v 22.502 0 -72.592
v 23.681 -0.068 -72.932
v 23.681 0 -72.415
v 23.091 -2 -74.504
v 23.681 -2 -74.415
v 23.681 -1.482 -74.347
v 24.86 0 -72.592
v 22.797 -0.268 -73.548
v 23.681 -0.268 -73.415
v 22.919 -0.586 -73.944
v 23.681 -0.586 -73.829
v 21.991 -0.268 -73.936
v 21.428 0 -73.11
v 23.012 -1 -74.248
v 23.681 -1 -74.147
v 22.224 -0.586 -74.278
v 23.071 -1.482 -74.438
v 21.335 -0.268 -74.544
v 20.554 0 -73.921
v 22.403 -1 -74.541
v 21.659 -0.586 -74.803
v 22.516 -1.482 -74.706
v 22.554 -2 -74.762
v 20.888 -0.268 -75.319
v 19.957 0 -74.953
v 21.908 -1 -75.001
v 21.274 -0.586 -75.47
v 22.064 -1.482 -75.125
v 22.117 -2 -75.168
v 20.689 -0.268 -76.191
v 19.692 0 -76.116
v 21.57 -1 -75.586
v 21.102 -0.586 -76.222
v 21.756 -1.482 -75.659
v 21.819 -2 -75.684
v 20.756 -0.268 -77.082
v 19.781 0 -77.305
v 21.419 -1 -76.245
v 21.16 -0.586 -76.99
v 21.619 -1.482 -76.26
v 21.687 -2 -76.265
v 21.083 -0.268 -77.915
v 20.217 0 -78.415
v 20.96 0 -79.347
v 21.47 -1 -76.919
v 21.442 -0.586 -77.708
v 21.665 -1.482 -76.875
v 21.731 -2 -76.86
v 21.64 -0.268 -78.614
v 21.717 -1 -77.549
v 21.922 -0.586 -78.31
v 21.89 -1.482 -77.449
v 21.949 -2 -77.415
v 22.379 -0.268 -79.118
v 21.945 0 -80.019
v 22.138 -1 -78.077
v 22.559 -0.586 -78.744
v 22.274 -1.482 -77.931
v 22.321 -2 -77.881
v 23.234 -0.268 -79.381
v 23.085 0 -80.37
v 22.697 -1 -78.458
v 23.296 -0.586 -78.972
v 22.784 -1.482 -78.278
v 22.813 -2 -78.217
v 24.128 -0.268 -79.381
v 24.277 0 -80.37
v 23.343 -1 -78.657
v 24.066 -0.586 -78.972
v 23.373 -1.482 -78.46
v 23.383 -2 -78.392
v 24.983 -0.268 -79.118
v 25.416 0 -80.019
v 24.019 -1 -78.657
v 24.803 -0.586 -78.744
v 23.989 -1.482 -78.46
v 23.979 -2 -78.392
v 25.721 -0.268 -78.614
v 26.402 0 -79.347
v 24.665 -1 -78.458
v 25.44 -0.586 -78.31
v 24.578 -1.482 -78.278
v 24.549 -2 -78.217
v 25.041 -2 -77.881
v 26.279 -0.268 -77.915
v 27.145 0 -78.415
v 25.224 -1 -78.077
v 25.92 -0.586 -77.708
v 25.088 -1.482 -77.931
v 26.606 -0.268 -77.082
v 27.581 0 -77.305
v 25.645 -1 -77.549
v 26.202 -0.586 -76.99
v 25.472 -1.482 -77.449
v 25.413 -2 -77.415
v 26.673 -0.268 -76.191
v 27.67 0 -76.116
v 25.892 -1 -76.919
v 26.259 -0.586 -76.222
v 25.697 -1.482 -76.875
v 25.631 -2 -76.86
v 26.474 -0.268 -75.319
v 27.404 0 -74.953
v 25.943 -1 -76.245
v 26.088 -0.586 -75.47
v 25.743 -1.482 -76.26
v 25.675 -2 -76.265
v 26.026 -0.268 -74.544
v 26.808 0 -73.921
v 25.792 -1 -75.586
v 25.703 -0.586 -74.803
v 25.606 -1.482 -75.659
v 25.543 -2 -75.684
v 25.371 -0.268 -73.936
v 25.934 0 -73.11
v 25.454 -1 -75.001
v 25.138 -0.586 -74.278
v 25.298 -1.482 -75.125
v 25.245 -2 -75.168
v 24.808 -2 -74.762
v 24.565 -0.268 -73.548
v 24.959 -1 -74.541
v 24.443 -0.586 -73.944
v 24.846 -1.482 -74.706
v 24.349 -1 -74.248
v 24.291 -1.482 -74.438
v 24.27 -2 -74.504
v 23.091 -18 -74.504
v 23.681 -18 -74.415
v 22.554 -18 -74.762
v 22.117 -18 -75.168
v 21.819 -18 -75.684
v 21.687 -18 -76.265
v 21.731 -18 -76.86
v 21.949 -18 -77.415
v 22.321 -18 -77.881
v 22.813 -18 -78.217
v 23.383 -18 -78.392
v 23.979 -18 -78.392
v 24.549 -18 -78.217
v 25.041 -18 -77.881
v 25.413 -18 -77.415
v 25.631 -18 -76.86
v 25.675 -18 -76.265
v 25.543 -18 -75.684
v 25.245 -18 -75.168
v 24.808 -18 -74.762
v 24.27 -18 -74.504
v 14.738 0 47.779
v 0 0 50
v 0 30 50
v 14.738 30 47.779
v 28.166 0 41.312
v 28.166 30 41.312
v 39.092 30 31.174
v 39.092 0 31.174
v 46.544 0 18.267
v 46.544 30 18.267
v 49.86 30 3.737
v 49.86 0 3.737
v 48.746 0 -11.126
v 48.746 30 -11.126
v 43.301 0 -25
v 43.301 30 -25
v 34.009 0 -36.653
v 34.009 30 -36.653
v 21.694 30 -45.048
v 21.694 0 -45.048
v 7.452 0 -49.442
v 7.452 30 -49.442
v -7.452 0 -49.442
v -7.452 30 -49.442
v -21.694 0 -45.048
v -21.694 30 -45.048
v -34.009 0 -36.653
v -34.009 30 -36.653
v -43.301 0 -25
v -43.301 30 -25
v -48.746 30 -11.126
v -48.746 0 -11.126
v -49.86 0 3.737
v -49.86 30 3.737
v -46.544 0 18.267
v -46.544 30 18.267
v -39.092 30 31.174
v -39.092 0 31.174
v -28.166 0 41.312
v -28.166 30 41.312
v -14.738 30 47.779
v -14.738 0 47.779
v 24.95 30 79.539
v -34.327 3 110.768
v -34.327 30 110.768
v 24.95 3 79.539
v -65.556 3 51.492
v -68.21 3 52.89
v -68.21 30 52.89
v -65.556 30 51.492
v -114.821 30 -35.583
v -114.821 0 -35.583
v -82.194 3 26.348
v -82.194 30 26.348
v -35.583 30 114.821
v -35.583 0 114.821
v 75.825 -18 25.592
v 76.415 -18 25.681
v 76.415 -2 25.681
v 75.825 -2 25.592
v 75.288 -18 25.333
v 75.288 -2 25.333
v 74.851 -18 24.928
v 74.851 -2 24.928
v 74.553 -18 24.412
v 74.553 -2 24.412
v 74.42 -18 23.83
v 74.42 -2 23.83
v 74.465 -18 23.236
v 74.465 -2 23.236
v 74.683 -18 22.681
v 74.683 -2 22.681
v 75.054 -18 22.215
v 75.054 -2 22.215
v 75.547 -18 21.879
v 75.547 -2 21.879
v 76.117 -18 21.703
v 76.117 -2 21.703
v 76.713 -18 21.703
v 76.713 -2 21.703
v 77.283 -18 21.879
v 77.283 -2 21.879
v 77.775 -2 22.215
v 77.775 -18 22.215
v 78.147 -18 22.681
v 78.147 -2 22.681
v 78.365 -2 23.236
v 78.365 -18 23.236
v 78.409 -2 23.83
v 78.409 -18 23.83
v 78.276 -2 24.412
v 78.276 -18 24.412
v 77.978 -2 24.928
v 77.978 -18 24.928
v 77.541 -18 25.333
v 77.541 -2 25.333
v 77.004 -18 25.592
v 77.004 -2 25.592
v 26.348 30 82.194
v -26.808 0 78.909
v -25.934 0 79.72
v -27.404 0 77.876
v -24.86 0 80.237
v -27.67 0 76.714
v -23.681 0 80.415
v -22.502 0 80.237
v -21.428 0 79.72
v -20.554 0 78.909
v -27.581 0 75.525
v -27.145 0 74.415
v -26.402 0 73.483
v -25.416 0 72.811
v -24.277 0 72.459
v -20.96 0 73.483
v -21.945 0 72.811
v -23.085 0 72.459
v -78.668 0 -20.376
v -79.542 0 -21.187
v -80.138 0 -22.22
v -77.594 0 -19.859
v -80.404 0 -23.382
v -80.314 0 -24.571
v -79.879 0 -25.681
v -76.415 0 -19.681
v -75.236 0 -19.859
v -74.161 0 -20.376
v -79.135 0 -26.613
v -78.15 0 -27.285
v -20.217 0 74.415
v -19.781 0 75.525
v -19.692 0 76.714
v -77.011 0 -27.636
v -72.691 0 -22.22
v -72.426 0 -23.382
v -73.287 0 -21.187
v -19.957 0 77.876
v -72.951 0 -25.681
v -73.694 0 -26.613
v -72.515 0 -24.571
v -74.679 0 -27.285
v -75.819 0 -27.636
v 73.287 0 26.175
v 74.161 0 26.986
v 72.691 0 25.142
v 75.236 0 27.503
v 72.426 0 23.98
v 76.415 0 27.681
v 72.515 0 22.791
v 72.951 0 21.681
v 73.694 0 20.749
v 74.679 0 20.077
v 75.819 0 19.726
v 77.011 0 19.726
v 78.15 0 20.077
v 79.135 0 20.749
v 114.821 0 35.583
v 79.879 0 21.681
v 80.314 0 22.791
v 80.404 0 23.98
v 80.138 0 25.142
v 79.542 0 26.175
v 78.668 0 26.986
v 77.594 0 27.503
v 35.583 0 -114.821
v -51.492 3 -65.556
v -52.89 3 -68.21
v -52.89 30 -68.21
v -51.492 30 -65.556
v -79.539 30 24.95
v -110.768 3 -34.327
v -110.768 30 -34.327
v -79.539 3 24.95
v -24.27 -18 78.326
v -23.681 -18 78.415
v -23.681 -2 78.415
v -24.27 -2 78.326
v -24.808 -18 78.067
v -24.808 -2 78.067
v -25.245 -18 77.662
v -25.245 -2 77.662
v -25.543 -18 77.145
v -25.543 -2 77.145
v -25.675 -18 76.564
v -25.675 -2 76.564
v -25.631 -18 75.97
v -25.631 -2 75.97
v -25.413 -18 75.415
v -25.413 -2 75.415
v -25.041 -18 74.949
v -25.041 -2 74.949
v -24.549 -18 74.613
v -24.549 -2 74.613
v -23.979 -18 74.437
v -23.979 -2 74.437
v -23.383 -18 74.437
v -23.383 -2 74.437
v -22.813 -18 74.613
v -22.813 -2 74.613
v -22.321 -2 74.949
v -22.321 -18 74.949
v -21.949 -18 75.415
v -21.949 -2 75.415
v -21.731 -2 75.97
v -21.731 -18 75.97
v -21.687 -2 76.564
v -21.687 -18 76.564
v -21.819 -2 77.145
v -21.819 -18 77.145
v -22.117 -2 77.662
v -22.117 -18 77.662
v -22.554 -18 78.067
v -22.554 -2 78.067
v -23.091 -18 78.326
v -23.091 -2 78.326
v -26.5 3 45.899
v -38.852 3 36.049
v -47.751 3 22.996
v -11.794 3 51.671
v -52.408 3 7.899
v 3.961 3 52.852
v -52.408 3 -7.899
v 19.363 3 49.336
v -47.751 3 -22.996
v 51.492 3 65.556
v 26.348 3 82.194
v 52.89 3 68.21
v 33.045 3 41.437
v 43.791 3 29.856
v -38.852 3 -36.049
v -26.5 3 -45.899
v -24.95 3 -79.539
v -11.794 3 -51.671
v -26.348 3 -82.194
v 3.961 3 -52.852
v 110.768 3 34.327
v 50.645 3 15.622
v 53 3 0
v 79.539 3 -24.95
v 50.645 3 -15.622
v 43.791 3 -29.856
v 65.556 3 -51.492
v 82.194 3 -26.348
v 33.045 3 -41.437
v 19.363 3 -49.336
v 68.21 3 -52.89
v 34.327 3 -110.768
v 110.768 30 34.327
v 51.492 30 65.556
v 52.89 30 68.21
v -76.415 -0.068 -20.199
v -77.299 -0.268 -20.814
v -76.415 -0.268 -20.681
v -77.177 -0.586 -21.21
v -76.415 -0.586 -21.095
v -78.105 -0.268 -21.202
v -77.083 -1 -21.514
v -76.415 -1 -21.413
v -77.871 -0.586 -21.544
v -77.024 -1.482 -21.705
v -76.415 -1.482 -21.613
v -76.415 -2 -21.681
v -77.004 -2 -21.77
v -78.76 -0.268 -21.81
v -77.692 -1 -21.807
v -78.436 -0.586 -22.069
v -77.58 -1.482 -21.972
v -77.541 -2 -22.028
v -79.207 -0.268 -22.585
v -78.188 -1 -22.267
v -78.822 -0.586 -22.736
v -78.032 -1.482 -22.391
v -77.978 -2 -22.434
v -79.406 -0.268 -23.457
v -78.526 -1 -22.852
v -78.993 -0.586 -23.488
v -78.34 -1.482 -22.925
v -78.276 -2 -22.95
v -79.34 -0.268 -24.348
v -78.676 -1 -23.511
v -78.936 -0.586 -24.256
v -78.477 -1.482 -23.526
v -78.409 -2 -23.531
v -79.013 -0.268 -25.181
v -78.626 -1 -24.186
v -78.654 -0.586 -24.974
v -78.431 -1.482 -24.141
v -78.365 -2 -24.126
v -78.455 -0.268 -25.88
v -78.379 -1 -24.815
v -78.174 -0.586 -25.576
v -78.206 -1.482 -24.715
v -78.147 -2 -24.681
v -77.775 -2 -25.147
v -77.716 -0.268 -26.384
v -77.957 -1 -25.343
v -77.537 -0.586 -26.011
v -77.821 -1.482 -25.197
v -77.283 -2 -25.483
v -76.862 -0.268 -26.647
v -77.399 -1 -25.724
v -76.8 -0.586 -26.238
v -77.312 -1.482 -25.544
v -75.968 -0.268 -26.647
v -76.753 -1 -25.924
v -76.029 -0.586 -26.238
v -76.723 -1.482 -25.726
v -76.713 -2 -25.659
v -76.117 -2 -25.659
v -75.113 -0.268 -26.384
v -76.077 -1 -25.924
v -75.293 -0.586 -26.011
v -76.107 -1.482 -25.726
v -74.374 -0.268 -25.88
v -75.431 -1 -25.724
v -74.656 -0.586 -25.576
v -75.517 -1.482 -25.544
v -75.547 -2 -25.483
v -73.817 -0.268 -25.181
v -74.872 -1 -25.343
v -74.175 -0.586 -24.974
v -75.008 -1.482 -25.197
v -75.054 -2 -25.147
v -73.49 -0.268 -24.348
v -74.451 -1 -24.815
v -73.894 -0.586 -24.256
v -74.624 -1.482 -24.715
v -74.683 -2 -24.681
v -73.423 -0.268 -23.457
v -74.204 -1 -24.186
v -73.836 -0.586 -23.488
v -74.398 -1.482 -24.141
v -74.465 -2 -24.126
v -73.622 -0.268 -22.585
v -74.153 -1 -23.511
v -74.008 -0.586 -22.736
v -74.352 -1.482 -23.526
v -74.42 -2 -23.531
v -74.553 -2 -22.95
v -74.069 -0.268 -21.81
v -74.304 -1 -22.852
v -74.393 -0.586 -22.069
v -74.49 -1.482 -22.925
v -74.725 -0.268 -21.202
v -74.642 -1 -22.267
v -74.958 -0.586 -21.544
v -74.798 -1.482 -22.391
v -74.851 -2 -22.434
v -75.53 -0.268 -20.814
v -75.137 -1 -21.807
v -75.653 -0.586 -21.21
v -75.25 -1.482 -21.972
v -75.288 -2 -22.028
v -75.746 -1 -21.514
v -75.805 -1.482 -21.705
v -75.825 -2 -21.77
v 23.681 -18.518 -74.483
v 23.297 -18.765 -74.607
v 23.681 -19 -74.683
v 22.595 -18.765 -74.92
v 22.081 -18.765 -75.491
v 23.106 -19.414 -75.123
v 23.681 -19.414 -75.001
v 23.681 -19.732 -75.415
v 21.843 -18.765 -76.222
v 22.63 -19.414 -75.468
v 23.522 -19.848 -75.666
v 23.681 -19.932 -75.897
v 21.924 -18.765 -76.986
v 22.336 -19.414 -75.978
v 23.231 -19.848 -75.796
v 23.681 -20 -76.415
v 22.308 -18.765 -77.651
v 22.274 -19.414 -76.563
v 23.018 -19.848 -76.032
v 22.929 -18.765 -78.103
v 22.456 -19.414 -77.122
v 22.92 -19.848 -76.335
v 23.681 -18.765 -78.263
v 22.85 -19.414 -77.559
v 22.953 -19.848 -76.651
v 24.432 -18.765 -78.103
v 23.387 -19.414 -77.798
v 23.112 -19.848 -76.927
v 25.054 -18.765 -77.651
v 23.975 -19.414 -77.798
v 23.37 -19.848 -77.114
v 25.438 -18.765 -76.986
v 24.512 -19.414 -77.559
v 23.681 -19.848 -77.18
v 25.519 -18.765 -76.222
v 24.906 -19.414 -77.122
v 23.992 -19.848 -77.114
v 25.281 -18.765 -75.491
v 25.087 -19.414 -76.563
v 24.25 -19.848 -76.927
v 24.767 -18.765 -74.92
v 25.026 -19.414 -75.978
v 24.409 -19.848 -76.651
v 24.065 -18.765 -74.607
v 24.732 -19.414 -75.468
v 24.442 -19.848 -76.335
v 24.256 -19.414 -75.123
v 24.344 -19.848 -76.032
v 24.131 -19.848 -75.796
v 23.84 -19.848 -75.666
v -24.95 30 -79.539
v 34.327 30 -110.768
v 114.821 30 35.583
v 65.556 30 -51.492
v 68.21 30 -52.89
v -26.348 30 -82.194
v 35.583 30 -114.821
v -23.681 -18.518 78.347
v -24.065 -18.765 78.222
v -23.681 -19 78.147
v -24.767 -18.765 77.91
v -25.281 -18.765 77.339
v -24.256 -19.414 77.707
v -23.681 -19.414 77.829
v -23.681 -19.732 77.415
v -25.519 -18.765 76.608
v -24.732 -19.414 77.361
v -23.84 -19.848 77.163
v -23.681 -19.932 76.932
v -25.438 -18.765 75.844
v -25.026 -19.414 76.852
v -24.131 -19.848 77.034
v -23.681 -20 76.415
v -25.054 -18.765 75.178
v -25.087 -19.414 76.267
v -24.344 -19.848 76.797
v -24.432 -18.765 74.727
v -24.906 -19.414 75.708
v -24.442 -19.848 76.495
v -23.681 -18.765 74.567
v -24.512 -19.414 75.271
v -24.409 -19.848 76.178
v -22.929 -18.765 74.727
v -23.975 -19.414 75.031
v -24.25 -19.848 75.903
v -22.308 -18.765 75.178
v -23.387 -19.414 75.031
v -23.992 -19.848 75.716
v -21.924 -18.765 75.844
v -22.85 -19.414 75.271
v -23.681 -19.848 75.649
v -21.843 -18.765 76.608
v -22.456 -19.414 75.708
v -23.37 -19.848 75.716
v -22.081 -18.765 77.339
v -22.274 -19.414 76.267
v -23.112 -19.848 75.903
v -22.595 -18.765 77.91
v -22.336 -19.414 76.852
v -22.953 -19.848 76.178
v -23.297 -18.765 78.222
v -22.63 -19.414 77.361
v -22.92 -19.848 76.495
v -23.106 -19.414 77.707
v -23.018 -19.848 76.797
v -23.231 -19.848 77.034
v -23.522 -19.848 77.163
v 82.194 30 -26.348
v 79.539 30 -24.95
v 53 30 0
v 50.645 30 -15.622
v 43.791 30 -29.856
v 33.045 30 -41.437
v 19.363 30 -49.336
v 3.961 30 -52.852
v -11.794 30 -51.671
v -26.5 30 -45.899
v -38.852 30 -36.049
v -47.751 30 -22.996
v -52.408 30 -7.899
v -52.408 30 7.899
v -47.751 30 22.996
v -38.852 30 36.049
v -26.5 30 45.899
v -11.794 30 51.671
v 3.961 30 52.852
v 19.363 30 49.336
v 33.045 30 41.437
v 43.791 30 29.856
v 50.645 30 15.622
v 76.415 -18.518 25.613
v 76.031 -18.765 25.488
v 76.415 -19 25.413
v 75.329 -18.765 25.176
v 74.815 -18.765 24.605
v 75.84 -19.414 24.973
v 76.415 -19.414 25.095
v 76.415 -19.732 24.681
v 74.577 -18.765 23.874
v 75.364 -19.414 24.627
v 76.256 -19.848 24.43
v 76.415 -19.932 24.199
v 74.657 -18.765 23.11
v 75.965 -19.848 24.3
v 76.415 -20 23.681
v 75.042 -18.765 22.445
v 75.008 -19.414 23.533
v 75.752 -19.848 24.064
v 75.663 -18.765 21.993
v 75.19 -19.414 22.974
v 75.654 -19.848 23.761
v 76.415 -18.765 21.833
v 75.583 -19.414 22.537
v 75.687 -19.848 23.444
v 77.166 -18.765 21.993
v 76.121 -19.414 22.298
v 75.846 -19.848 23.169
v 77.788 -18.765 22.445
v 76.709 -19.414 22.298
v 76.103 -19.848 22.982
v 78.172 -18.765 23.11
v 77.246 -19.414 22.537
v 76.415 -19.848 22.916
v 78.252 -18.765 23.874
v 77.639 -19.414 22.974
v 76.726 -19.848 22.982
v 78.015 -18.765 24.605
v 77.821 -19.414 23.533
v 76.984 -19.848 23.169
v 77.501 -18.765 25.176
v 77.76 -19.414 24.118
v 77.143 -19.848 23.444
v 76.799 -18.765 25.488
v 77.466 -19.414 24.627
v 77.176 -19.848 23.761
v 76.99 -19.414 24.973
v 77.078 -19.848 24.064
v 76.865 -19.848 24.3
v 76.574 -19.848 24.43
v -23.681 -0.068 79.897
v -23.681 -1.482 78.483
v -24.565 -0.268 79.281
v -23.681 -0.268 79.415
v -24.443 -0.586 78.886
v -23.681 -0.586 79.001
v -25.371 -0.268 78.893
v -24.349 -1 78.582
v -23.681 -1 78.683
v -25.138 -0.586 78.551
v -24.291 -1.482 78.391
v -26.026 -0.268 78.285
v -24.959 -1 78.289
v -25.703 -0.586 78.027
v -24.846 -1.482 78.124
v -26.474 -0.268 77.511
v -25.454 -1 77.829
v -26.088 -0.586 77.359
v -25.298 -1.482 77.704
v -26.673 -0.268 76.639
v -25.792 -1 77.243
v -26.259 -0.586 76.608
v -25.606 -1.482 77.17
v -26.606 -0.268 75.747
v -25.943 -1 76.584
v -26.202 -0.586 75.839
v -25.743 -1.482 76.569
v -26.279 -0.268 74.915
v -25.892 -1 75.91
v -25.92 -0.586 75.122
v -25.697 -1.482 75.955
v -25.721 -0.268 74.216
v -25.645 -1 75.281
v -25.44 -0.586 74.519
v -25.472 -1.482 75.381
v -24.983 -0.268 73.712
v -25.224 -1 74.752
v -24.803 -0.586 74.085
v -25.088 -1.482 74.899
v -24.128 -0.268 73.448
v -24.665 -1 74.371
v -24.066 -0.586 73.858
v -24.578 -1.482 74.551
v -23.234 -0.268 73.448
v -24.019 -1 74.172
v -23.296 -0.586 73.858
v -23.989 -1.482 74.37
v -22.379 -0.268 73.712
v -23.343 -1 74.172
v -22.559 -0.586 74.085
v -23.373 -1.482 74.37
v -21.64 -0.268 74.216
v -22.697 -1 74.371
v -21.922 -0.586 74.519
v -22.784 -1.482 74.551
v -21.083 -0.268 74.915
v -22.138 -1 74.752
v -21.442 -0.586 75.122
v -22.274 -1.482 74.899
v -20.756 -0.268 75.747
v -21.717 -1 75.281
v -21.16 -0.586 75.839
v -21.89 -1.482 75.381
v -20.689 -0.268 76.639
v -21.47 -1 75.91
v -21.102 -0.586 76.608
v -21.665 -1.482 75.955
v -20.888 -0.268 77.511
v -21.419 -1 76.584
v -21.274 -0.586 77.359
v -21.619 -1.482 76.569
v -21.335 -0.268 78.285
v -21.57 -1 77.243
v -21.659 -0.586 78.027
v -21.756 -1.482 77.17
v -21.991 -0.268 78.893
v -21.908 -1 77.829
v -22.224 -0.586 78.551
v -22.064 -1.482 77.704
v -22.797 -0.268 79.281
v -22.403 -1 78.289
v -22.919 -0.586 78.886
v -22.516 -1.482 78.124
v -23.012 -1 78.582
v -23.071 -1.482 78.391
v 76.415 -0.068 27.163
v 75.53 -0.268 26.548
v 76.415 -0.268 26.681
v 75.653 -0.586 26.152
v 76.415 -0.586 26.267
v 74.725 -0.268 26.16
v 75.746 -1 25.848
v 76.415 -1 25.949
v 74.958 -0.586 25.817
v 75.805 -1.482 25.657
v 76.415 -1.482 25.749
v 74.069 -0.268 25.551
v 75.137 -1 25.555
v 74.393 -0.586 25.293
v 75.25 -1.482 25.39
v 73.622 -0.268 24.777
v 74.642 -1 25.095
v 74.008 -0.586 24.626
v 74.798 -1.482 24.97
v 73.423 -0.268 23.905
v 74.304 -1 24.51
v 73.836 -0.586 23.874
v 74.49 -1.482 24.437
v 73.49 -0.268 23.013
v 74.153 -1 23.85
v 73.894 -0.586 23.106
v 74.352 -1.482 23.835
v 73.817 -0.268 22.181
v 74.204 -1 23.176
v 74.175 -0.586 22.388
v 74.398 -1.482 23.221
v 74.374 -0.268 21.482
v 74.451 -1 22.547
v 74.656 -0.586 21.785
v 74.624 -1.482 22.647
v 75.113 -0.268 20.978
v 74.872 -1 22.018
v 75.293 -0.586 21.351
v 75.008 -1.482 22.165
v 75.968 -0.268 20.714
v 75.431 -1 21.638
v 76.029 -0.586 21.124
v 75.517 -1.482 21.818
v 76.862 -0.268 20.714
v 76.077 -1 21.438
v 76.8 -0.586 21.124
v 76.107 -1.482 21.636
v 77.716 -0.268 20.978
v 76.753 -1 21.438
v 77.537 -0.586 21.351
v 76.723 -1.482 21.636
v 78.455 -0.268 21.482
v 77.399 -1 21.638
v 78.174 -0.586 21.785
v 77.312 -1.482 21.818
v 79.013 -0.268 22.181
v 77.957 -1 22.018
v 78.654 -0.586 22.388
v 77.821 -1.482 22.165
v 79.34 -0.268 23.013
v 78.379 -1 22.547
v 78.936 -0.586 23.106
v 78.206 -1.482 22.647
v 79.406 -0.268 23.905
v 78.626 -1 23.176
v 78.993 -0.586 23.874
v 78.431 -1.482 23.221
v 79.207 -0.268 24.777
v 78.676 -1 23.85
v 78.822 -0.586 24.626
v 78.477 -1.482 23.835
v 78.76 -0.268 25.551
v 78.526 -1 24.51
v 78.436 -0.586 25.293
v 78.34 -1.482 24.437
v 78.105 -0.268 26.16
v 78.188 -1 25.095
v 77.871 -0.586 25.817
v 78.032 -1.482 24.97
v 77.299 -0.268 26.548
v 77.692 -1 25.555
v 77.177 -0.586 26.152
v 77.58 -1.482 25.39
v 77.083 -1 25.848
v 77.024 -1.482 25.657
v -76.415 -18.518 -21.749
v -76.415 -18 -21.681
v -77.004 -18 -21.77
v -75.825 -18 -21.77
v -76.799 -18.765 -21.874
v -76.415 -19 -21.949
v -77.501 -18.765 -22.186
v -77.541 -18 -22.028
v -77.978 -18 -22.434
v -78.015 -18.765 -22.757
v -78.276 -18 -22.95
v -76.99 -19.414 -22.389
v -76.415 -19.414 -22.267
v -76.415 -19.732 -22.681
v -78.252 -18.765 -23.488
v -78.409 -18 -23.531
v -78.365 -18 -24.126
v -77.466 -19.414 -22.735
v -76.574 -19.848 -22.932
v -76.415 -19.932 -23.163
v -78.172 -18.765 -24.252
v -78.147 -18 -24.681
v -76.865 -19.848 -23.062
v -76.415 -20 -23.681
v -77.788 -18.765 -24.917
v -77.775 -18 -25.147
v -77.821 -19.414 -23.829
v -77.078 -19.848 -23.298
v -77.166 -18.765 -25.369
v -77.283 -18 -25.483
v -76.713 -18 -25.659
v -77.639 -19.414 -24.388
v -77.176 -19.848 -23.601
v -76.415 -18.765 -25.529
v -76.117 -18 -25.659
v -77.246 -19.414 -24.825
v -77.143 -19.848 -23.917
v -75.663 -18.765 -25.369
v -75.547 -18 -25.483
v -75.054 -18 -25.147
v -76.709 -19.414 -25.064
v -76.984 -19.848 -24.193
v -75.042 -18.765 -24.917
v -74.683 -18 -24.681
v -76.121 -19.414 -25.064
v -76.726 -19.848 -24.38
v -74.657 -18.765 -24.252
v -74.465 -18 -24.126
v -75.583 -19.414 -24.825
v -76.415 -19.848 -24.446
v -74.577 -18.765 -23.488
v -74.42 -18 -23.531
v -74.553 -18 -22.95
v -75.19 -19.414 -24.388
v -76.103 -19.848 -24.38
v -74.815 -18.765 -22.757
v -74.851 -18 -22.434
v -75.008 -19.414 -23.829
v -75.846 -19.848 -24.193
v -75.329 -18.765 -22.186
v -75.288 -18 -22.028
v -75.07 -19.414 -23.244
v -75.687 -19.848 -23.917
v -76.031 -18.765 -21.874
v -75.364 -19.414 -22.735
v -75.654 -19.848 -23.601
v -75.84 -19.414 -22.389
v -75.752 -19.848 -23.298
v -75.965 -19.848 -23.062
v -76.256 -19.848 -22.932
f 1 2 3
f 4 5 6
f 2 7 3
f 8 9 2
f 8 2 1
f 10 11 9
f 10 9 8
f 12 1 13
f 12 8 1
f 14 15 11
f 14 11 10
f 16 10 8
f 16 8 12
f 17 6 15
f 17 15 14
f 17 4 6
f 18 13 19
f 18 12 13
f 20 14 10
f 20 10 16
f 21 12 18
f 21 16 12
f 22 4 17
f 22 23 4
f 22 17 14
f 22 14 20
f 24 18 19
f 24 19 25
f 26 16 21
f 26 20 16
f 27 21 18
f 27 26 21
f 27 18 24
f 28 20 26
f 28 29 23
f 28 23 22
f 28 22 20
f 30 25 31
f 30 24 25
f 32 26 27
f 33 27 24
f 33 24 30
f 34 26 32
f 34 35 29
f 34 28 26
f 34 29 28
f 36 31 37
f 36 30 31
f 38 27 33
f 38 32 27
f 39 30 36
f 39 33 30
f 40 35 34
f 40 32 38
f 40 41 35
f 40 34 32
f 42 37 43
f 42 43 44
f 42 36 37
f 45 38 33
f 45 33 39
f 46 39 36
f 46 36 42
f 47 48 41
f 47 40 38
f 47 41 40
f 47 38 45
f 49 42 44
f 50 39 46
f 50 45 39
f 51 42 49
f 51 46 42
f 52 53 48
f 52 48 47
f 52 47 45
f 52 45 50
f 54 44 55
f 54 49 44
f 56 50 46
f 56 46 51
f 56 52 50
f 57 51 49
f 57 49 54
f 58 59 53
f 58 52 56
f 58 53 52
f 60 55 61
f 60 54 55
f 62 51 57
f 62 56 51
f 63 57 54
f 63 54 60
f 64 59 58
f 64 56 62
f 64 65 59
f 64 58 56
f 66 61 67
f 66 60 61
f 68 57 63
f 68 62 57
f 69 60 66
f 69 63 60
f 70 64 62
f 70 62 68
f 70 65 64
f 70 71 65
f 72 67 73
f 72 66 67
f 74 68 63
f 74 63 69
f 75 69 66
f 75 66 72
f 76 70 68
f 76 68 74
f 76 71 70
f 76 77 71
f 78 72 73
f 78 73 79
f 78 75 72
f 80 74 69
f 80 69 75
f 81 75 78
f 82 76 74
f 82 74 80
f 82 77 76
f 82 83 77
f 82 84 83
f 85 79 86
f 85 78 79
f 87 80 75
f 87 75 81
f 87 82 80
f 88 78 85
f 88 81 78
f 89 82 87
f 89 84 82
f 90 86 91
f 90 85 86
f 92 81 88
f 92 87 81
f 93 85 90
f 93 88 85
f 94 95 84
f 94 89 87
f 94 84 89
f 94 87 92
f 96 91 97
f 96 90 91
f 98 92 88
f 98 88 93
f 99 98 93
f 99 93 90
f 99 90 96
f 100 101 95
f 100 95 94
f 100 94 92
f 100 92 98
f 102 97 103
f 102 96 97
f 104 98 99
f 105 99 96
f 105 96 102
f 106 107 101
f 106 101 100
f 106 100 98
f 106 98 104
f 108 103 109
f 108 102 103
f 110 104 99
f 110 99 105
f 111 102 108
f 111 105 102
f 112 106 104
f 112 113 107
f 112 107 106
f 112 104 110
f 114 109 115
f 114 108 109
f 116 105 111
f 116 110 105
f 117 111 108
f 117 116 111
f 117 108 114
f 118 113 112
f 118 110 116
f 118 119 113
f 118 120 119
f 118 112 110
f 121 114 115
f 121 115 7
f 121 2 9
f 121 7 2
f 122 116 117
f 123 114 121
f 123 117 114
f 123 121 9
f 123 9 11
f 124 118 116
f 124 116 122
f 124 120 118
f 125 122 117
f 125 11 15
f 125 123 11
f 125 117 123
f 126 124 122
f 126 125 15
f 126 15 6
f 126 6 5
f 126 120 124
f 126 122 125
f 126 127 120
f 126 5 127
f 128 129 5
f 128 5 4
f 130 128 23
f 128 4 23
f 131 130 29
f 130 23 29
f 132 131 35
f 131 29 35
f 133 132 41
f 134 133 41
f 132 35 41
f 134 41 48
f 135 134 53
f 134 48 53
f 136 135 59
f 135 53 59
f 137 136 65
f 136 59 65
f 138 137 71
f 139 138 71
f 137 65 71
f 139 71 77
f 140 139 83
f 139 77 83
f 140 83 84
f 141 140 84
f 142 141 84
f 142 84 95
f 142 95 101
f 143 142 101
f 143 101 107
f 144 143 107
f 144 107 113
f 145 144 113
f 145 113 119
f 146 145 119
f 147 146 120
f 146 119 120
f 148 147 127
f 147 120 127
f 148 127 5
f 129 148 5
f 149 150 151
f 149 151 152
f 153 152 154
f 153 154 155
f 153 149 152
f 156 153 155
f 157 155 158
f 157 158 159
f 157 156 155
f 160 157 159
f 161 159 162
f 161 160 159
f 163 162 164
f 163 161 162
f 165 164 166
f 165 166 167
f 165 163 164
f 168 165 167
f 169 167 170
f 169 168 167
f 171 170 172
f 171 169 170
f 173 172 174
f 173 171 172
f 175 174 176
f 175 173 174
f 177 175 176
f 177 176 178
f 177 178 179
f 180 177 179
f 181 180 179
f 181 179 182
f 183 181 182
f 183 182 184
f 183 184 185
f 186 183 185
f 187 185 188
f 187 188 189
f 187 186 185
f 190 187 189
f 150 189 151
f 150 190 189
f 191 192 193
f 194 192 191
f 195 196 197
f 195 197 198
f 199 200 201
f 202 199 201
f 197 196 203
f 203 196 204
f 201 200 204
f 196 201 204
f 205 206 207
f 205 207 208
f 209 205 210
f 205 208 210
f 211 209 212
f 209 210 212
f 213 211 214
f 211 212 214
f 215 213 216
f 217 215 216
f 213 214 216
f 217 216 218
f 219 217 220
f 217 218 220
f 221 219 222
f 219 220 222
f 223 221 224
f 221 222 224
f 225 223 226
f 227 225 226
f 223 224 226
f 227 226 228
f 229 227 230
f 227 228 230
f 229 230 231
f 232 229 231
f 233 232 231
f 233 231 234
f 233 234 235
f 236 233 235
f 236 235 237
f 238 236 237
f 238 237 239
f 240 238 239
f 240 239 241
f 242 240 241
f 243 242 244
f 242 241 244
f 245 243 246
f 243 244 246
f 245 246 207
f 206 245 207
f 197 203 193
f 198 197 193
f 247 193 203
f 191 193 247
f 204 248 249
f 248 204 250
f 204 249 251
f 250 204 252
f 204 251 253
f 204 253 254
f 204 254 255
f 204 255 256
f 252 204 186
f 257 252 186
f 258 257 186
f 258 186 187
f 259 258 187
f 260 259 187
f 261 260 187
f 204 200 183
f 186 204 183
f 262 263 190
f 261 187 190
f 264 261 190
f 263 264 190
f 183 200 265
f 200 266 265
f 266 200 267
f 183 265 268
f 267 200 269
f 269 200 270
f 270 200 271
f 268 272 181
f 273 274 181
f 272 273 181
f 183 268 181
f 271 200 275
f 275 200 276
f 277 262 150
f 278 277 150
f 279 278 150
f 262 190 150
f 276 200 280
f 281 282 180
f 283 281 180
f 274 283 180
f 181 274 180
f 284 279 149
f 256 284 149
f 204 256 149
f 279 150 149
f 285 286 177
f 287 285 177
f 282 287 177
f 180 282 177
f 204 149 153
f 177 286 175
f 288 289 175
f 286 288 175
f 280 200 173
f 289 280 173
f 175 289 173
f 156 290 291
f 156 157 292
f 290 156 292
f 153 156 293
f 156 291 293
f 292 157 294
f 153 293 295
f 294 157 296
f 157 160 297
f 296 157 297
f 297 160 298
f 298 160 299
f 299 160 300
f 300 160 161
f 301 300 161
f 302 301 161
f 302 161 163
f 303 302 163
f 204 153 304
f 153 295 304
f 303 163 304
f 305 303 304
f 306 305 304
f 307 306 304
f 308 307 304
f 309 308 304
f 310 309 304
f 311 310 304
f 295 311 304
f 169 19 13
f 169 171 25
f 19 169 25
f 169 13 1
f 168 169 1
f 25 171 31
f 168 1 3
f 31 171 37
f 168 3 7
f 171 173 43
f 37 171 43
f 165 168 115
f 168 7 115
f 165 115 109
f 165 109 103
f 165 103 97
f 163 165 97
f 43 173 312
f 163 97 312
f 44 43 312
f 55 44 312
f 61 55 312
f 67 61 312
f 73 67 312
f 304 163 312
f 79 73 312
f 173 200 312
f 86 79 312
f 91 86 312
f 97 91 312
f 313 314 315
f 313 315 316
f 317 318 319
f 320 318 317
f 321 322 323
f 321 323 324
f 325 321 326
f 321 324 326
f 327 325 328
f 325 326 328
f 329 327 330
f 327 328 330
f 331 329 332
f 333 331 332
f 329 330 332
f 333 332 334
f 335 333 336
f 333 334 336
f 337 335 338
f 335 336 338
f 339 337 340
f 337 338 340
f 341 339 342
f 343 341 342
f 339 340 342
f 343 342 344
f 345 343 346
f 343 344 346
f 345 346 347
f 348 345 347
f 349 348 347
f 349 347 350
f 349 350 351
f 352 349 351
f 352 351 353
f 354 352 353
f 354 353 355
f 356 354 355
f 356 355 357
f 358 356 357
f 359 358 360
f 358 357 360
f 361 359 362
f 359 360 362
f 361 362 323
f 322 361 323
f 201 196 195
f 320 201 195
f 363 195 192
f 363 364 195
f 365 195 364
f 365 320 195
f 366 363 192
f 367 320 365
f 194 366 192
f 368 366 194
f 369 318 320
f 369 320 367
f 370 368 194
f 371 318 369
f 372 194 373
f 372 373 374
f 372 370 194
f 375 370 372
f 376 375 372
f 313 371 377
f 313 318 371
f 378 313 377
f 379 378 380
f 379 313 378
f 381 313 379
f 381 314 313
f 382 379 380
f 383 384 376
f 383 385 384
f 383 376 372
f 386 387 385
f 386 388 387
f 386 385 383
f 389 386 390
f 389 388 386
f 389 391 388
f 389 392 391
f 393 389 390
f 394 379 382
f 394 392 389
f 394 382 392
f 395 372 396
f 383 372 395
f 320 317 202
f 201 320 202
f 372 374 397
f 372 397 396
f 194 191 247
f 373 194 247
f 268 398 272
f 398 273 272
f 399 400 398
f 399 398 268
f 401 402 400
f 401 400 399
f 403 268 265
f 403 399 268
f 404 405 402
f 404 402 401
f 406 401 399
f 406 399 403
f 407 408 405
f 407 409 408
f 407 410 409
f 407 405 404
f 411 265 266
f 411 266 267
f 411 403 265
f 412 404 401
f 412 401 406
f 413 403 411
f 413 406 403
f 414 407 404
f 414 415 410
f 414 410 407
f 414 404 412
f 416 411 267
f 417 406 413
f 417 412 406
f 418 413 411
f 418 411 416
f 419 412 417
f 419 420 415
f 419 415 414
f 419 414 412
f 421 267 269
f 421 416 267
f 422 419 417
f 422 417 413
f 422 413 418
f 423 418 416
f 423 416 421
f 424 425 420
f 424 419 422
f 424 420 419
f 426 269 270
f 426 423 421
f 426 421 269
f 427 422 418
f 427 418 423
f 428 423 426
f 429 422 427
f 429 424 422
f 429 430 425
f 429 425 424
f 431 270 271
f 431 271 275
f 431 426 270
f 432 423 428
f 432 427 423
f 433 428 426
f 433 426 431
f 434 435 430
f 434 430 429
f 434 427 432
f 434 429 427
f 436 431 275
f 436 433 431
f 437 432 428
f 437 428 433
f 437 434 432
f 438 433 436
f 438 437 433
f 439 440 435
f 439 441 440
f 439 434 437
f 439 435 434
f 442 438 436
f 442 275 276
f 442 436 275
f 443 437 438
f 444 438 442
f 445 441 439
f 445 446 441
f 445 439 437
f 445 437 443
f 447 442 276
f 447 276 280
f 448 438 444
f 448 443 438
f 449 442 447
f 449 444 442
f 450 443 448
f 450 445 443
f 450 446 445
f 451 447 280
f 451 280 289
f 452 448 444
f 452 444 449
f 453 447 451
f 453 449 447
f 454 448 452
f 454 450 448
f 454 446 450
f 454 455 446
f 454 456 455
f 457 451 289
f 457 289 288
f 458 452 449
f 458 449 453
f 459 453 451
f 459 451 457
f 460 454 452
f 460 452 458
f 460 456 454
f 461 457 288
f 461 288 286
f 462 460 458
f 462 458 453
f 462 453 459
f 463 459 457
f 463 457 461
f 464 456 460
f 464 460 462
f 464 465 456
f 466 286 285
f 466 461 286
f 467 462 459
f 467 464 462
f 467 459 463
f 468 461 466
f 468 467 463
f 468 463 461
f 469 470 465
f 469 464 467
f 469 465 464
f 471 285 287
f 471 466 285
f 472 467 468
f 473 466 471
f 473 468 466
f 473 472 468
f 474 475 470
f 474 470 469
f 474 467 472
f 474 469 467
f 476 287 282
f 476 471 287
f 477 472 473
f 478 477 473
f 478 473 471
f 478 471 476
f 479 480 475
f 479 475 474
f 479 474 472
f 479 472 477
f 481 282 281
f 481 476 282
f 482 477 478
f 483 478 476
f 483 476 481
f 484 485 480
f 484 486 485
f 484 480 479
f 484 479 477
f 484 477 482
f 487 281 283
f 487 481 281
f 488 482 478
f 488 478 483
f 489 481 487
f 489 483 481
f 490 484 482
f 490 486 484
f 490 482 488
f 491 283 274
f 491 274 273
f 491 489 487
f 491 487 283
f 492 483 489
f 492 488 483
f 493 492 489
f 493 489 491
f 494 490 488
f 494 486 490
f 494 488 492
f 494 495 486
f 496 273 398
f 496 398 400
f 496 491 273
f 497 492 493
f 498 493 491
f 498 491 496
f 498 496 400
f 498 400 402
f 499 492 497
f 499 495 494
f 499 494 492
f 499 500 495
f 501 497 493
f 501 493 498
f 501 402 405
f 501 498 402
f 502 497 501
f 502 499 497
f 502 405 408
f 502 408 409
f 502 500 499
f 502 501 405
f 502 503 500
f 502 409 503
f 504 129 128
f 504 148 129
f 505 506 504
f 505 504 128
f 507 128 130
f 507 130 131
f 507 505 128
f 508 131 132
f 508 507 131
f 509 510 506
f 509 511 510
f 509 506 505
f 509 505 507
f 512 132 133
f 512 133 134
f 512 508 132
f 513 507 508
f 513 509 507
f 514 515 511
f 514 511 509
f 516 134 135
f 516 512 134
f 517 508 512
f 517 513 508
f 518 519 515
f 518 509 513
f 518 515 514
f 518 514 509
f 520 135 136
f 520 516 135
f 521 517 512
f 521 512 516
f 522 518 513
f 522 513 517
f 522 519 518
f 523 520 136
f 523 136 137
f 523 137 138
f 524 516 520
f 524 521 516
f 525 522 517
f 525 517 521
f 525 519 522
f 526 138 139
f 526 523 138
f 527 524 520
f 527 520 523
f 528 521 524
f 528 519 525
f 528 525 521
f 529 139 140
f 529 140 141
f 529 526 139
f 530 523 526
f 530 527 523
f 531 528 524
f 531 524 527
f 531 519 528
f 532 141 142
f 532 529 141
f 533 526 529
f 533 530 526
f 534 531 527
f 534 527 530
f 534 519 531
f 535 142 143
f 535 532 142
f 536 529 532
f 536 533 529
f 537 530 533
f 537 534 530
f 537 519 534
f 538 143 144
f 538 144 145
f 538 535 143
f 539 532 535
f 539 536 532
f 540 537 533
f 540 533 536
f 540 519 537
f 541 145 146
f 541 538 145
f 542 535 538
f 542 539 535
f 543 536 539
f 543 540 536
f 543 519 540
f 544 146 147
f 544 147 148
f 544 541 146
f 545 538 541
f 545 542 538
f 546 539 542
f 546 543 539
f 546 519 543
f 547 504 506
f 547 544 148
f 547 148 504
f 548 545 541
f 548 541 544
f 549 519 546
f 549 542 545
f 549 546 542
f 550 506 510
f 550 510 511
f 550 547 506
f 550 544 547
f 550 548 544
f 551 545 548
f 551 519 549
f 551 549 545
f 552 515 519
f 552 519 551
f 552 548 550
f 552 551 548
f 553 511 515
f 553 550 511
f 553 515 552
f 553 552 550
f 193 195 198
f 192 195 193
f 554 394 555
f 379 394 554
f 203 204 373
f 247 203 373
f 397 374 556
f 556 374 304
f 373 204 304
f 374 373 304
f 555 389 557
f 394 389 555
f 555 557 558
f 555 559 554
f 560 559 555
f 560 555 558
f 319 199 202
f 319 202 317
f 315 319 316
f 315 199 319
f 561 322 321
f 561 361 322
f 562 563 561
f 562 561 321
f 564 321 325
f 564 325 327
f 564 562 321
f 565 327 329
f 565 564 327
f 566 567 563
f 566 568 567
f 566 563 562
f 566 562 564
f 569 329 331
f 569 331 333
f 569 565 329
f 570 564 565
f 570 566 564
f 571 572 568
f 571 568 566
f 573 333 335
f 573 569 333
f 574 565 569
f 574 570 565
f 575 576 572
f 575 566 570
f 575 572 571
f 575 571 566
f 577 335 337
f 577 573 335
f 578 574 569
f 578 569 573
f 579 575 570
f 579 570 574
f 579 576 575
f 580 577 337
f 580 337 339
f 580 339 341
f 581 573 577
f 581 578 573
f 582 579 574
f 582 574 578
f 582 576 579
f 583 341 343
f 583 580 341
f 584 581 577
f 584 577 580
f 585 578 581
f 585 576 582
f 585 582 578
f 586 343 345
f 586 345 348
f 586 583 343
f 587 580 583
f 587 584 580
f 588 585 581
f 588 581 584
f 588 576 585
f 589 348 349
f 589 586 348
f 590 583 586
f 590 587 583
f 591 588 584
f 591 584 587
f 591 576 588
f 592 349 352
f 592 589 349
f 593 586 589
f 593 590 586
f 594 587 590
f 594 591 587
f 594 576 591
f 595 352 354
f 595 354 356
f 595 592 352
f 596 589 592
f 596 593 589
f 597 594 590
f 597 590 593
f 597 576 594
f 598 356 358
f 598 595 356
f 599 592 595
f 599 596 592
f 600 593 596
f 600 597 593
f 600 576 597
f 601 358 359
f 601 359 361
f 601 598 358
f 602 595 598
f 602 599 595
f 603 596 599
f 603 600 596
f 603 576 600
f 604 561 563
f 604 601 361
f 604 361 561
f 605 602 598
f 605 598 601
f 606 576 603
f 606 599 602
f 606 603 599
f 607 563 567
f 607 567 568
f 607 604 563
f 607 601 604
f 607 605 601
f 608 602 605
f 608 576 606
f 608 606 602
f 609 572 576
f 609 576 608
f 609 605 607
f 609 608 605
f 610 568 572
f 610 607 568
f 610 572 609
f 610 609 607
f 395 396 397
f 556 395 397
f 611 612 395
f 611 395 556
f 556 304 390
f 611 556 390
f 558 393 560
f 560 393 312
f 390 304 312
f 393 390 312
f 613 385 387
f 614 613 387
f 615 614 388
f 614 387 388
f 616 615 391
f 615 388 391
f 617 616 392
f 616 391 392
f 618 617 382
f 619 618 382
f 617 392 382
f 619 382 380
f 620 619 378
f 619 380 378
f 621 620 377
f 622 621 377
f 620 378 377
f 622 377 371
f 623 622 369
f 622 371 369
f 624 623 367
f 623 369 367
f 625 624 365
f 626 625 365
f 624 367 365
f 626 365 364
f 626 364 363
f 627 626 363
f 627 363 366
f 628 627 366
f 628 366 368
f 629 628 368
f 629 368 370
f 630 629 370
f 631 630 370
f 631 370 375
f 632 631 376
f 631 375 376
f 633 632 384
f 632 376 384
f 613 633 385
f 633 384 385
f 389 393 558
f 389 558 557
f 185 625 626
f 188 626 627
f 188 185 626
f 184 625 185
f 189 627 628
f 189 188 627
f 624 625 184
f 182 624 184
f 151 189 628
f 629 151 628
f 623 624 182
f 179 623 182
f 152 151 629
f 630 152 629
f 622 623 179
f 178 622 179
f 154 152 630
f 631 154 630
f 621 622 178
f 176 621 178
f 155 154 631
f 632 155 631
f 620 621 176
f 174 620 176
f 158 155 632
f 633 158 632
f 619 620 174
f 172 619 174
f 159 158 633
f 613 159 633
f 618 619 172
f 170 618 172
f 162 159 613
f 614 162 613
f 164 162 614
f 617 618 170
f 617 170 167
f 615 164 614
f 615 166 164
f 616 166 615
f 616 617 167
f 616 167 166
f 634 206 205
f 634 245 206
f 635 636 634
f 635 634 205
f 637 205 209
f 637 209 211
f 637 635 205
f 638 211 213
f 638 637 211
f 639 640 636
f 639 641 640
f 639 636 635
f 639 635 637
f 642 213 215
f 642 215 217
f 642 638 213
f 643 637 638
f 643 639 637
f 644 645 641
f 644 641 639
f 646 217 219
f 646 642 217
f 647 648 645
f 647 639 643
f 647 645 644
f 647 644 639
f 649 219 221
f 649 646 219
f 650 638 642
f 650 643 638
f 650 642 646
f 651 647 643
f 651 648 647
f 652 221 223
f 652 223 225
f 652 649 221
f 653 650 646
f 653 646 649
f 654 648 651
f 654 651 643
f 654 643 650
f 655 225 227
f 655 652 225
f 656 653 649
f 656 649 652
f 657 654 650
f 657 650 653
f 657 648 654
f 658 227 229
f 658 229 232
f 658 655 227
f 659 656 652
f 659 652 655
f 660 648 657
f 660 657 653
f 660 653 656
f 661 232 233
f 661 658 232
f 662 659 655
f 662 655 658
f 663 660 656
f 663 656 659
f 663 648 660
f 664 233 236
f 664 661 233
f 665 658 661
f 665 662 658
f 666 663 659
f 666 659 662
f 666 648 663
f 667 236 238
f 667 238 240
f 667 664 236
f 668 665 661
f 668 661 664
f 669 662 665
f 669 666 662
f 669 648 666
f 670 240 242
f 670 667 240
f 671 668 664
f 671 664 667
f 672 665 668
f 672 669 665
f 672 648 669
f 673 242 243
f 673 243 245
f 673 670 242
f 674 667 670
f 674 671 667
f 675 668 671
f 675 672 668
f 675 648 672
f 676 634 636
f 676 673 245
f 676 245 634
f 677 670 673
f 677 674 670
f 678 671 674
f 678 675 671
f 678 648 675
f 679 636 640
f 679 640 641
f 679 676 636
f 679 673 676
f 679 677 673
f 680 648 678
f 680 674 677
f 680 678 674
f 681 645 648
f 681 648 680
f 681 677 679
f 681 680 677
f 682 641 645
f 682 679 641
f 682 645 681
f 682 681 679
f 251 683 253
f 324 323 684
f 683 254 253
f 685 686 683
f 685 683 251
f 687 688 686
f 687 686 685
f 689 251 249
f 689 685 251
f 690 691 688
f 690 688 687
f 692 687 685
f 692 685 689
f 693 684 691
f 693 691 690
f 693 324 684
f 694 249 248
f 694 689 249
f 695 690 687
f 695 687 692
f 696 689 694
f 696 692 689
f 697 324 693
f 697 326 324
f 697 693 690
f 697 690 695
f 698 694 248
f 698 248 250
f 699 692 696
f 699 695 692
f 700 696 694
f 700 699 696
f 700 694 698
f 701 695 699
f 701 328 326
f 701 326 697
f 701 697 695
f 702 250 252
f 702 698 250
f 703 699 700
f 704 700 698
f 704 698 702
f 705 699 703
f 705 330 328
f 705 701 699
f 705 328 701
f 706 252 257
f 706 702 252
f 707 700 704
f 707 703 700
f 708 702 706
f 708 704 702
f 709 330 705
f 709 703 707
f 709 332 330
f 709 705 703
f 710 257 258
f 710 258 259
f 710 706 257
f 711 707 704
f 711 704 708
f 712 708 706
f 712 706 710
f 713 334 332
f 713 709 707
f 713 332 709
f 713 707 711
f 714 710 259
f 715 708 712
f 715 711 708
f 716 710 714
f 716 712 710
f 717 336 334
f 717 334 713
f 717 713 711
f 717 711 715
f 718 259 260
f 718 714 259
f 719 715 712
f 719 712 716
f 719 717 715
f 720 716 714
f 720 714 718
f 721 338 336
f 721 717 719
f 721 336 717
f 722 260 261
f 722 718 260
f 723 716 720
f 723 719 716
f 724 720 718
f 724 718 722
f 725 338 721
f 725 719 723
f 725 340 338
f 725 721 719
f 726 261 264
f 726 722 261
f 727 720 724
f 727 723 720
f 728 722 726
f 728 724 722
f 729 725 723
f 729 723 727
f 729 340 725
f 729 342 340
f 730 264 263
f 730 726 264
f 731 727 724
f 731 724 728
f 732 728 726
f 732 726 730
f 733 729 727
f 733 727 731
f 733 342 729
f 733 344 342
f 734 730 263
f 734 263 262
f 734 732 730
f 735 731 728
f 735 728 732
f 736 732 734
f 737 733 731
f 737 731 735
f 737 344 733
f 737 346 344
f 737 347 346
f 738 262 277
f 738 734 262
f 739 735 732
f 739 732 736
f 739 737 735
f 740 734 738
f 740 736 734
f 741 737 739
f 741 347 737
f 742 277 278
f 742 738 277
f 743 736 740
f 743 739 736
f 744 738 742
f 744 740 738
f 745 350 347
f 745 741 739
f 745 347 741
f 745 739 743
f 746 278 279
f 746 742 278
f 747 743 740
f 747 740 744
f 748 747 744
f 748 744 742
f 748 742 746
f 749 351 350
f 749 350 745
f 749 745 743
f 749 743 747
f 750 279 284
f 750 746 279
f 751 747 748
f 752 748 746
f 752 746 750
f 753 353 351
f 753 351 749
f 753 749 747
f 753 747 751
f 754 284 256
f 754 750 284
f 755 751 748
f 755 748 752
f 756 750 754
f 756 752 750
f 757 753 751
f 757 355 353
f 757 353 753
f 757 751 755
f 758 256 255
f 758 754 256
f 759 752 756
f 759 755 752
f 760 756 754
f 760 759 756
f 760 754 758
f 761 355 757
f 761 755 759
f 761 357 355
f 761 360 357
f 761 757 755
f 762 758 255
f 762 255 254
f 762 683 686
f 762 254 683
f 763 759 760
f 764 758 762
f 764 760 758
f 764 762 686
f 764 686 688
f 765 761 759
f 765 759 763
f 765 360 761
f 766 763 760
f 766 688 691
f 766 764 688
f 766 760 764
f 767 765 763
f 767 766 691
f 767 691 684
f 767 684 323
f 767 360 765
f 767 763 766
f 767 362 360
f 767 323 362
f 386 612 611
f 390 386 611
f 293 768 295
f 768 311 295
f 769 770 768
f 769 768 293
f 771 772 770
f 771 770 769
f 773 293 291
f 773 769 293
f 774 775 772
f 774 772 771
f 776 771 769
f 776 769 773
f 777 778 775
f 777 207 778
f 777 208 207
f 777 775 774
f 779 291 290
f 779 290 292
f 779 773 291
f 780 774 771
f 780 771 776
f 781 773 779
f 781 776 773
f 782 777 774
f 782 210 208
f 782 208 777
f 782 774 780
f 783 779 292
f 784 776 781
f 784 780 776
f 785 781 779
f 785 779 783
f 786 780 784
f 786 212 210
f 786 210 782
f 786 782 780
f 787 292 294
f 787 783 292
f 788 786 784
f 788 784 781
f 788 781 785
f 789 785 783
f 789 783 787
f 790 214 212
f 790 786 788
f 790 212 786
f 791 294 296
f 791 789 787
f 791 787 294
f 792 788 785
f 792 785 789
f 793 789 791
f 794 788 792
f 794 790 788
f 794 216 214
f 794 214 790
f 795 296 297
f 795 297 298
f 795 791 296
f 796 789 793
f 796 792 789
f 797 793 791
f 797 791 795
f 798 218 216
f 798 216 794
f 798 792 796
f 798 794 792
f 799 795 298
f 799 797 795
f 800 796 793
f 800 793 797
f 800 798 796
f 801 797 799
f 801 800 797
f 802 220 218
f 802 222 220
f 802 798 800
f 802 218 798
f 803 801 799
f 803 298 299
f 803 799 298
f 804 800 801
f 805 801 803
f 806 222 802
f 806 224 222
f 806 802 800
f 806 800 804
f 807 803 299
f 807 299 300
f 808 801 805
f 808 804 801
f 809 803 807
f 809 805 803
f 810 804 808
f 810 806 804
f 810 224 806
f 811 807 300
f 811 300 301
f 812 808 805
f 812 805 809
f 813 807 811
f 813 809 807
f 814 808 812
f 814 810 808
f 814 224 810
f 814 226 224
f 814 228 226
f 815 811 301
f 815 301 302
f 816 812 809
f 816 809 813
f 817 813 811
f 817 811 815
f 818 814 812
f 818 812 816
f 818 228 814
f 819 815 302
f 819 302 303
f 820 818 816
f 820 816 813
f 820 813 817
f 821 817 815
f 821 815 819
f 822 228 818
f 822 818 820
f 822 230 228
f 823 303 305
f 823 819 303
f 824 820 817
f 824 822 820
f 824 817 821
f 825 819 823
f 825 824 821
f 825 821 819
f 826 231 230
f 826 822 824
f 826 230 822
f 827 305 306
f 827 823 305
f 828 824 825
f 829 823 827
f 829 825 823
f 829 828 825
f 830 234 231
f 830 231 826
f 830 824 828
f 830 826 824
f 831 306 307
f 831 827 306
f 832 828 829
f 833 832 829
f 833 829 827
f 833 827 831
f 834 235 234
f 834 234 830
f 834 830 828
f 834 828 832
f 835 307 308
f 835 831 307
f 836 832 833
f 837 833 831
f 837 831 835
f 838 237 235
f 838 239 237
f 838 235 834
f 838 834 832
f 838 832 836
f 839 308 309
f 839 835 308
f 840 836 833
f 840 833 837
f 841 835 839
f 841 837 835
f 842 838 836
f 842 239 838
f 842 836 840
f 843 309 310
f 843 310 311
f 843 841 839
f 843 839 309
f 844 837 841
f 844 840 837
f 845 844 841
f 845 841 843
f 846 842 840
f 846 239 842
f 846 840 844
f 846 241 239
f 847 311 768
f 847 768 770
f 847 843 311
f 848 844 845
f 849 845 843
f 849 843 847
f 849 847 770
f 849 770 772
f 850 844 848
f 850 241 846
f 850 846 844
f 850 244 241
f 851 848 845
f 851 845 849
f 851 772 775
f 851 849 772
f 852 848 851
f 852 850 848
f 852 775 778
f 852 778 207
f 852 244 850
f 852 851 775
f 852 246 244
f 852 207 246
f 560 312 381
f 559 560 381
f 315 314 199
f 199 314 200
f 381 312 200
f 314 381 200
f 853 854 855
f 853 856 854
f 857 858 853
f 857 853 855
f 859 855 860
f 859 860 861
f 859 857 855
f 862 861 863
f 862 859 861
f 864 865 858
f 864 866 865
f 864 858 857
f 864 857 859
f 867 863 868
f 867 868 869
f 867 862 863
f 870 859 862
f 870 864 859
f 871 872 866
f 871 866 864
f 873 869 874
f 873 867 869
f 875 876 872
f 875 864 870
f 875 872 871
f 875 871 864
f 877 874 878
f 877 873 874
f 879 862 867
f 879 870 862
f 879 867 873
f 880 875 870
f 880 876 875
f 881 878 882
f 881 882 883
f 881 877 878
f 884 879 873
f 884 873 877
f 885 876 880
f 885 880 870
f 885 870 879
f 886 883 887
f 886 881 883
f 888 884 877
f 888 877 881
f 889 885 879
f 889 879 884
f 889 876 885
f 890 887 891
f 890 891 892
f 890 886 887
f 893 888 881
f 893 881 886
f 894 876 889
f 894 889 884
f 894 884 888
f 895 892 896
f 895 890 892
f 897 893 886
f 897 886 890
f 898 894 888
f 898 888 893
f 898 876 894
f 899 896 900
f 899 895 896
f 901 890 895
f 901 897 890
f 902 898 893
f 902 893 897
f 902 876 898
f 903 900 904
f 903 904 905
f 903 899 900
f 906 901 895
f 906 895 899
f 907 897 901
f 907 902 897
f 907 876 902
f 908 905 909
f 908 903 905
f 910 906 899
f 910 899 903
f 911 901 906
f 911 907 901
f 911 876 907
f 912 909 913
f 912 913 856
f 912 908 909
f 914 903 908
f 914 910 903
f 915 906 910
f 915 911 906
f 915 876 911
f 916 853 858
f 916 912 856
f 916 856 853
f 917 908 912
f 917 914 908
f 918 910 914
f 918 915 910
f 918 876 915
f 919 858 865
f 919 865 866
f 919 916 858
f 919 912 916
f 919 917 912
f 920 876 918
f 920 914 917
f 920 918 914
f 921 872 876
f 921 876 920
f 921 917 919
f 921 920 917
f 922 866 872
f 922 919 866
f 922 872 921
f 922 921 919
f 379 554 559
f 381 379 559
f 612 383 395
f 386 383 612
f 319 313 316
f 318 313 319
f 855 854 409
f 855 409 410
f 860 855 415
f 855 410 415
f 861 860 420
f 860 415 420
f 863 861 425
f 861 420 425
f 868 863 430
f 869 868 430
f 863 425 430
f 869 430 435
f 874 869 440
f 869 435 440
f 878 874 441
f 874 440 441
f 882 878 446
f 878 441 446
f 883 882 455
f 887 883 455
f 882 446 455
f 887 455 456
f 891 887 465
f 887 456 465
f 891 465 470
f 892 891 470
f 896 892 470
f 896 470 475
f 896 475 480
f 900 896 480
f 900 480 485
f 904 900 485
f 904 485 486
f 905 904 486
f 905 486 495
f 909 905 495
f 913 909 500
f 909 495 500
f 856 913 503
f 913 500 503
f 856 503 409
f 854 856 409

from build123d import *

# Parameters (mm, degrees)
SKETCH2_R           = 50
BOSS_EXTRUDE1_DEPTH = 30
SKETCH6_R           = 2
BOSS_EXTRUDE5_DEPTH = 20
FILLET2_R           = 2
SHELL1_START        = 3
SHELL1_OUTLINE_R    = 53
SHELL1_DEPTH        = 27
CUT_EXTRUDE3_DEPTH  = 27


# Read off the part's stored shape, not the designer's step: Shell1
with BuildPart() as part:
    # Sketch2 → Boss-Extrude1 (new body)
    with BuildSketch(Plane(origin=(0, 0, 0), x_dir=(1, 0, 0), z_dir=(0, 1, 0))):
        Polygon((-35.583006561, -114.820946016), (114.820946016, -35.583006561), (35.583006561, 114.820946016), (-114.820946016, 35.583006561), align=None)
        with Locations(Location((0, 0, 0), (0, 0, 270))):
            Circle(SKETCH2_R, mode=Mode.SUBTRACT)
    extrude(amount=BOSS_EXTRUDE1_DEPTH)

    # Sketch6 → Boss-Extrude5 (add)
    with BuildSketch(Plane(origin=(0, 0, 0), x_dir=(-1, 0, 0), z_dir=(0, -1, 0))):
        with Locations(Location((76.414747812, 23.680927279, 0), (0, 0, 270))):
            Circle(SKETCH6_R)
        with Locations(Location((23.680927279, -76.414747812, 0), (0, 0, 270))):
            Circle(SKETCH6_R)
        with Locations(Location((-76.414747812, -23.680927279, 0), (0, 0, 270))):
            Circle(SKETCH6_R)
        with Locations(Location((-23.680927279, 76.414747812, 0), (0, 0, 270))):
            Circle(SKETCH6_R)
    extrude(amount=BOSS_EXTRUDE5_DEPTH)

    # Fillet2
    fillet2_edges = [part.edges().sort_by_distance(p)[0] for p in [
        (-76.414747812, 0, -25.680927279),
        (-76.414747812, -20, -25.680927279),
        (23.680927279, 0, -78.414747812),
        (23.680927279, -20, -78.414747812),
        (76.414747812, 0, 21.680927279),
        (76.414747812, -20, 21.680927279),
        (-23.680927279, 0, 74.414747812),
        (-23.680927279, -20, 74.414747812),
    ]]
    fillet(fillet2_edges, radius=FILLET2_R)

    # Shell1 outline → Shell1 (cut)
    with BuildSketch(Plane(origin=(0, 0, 0), x_dir=(1, 0, 0), z_dir=(0, 1, 0)).offset(SHELL1_START)):
        Polygon((110.768442039, -34.327135741), (34.327135741, 110.768442039), (-110.768442039, 34.327135741), (-34.327135741, -110.768442039), align=None)
        Circle(SHELL1_OUTLINE_R, mode=Mode.SUBTRACT)
    extrude(amount=SHELL1_DEPTH, mode=Mode.SUBTRACT)

    # Sketch7 → Cut-Extrude3 (cut)
    with BuildSketch(Plane(origin=(0, 30, 0), x_dir=(1, 0, 0), z_dir=(0, 1, 0))):
        Polygon((79.539371783, 24.949716157), (82.193559182, 26.348032736), (68.210393395, 52.88990672), (65.556205997, 51.491590141), align=None)
        Polygon((51.491590141, -65.556205997), (24.949716157, -79.539371783), (26.348032736, -82.193559182), (52.88990672, -68.210393395), align=None)
        Polygon((-65.556205997, -51.491590141), (-79.539371783, -24.949716157), (-82.193559182, -26.348032736), (-68.210393395, -52.88990672), align=None)
        Polygon((-51.491590141, 65.556205997), (-24.949716157, 79.539371783), (-26.348032736, 82.193559182), (-52.88990672, 68.210393395), align=None)
    extrude(amount=-CUT_EXTRUDE3_DEPTH, mode=Mode.SUBTRACT)


solid = part.part
